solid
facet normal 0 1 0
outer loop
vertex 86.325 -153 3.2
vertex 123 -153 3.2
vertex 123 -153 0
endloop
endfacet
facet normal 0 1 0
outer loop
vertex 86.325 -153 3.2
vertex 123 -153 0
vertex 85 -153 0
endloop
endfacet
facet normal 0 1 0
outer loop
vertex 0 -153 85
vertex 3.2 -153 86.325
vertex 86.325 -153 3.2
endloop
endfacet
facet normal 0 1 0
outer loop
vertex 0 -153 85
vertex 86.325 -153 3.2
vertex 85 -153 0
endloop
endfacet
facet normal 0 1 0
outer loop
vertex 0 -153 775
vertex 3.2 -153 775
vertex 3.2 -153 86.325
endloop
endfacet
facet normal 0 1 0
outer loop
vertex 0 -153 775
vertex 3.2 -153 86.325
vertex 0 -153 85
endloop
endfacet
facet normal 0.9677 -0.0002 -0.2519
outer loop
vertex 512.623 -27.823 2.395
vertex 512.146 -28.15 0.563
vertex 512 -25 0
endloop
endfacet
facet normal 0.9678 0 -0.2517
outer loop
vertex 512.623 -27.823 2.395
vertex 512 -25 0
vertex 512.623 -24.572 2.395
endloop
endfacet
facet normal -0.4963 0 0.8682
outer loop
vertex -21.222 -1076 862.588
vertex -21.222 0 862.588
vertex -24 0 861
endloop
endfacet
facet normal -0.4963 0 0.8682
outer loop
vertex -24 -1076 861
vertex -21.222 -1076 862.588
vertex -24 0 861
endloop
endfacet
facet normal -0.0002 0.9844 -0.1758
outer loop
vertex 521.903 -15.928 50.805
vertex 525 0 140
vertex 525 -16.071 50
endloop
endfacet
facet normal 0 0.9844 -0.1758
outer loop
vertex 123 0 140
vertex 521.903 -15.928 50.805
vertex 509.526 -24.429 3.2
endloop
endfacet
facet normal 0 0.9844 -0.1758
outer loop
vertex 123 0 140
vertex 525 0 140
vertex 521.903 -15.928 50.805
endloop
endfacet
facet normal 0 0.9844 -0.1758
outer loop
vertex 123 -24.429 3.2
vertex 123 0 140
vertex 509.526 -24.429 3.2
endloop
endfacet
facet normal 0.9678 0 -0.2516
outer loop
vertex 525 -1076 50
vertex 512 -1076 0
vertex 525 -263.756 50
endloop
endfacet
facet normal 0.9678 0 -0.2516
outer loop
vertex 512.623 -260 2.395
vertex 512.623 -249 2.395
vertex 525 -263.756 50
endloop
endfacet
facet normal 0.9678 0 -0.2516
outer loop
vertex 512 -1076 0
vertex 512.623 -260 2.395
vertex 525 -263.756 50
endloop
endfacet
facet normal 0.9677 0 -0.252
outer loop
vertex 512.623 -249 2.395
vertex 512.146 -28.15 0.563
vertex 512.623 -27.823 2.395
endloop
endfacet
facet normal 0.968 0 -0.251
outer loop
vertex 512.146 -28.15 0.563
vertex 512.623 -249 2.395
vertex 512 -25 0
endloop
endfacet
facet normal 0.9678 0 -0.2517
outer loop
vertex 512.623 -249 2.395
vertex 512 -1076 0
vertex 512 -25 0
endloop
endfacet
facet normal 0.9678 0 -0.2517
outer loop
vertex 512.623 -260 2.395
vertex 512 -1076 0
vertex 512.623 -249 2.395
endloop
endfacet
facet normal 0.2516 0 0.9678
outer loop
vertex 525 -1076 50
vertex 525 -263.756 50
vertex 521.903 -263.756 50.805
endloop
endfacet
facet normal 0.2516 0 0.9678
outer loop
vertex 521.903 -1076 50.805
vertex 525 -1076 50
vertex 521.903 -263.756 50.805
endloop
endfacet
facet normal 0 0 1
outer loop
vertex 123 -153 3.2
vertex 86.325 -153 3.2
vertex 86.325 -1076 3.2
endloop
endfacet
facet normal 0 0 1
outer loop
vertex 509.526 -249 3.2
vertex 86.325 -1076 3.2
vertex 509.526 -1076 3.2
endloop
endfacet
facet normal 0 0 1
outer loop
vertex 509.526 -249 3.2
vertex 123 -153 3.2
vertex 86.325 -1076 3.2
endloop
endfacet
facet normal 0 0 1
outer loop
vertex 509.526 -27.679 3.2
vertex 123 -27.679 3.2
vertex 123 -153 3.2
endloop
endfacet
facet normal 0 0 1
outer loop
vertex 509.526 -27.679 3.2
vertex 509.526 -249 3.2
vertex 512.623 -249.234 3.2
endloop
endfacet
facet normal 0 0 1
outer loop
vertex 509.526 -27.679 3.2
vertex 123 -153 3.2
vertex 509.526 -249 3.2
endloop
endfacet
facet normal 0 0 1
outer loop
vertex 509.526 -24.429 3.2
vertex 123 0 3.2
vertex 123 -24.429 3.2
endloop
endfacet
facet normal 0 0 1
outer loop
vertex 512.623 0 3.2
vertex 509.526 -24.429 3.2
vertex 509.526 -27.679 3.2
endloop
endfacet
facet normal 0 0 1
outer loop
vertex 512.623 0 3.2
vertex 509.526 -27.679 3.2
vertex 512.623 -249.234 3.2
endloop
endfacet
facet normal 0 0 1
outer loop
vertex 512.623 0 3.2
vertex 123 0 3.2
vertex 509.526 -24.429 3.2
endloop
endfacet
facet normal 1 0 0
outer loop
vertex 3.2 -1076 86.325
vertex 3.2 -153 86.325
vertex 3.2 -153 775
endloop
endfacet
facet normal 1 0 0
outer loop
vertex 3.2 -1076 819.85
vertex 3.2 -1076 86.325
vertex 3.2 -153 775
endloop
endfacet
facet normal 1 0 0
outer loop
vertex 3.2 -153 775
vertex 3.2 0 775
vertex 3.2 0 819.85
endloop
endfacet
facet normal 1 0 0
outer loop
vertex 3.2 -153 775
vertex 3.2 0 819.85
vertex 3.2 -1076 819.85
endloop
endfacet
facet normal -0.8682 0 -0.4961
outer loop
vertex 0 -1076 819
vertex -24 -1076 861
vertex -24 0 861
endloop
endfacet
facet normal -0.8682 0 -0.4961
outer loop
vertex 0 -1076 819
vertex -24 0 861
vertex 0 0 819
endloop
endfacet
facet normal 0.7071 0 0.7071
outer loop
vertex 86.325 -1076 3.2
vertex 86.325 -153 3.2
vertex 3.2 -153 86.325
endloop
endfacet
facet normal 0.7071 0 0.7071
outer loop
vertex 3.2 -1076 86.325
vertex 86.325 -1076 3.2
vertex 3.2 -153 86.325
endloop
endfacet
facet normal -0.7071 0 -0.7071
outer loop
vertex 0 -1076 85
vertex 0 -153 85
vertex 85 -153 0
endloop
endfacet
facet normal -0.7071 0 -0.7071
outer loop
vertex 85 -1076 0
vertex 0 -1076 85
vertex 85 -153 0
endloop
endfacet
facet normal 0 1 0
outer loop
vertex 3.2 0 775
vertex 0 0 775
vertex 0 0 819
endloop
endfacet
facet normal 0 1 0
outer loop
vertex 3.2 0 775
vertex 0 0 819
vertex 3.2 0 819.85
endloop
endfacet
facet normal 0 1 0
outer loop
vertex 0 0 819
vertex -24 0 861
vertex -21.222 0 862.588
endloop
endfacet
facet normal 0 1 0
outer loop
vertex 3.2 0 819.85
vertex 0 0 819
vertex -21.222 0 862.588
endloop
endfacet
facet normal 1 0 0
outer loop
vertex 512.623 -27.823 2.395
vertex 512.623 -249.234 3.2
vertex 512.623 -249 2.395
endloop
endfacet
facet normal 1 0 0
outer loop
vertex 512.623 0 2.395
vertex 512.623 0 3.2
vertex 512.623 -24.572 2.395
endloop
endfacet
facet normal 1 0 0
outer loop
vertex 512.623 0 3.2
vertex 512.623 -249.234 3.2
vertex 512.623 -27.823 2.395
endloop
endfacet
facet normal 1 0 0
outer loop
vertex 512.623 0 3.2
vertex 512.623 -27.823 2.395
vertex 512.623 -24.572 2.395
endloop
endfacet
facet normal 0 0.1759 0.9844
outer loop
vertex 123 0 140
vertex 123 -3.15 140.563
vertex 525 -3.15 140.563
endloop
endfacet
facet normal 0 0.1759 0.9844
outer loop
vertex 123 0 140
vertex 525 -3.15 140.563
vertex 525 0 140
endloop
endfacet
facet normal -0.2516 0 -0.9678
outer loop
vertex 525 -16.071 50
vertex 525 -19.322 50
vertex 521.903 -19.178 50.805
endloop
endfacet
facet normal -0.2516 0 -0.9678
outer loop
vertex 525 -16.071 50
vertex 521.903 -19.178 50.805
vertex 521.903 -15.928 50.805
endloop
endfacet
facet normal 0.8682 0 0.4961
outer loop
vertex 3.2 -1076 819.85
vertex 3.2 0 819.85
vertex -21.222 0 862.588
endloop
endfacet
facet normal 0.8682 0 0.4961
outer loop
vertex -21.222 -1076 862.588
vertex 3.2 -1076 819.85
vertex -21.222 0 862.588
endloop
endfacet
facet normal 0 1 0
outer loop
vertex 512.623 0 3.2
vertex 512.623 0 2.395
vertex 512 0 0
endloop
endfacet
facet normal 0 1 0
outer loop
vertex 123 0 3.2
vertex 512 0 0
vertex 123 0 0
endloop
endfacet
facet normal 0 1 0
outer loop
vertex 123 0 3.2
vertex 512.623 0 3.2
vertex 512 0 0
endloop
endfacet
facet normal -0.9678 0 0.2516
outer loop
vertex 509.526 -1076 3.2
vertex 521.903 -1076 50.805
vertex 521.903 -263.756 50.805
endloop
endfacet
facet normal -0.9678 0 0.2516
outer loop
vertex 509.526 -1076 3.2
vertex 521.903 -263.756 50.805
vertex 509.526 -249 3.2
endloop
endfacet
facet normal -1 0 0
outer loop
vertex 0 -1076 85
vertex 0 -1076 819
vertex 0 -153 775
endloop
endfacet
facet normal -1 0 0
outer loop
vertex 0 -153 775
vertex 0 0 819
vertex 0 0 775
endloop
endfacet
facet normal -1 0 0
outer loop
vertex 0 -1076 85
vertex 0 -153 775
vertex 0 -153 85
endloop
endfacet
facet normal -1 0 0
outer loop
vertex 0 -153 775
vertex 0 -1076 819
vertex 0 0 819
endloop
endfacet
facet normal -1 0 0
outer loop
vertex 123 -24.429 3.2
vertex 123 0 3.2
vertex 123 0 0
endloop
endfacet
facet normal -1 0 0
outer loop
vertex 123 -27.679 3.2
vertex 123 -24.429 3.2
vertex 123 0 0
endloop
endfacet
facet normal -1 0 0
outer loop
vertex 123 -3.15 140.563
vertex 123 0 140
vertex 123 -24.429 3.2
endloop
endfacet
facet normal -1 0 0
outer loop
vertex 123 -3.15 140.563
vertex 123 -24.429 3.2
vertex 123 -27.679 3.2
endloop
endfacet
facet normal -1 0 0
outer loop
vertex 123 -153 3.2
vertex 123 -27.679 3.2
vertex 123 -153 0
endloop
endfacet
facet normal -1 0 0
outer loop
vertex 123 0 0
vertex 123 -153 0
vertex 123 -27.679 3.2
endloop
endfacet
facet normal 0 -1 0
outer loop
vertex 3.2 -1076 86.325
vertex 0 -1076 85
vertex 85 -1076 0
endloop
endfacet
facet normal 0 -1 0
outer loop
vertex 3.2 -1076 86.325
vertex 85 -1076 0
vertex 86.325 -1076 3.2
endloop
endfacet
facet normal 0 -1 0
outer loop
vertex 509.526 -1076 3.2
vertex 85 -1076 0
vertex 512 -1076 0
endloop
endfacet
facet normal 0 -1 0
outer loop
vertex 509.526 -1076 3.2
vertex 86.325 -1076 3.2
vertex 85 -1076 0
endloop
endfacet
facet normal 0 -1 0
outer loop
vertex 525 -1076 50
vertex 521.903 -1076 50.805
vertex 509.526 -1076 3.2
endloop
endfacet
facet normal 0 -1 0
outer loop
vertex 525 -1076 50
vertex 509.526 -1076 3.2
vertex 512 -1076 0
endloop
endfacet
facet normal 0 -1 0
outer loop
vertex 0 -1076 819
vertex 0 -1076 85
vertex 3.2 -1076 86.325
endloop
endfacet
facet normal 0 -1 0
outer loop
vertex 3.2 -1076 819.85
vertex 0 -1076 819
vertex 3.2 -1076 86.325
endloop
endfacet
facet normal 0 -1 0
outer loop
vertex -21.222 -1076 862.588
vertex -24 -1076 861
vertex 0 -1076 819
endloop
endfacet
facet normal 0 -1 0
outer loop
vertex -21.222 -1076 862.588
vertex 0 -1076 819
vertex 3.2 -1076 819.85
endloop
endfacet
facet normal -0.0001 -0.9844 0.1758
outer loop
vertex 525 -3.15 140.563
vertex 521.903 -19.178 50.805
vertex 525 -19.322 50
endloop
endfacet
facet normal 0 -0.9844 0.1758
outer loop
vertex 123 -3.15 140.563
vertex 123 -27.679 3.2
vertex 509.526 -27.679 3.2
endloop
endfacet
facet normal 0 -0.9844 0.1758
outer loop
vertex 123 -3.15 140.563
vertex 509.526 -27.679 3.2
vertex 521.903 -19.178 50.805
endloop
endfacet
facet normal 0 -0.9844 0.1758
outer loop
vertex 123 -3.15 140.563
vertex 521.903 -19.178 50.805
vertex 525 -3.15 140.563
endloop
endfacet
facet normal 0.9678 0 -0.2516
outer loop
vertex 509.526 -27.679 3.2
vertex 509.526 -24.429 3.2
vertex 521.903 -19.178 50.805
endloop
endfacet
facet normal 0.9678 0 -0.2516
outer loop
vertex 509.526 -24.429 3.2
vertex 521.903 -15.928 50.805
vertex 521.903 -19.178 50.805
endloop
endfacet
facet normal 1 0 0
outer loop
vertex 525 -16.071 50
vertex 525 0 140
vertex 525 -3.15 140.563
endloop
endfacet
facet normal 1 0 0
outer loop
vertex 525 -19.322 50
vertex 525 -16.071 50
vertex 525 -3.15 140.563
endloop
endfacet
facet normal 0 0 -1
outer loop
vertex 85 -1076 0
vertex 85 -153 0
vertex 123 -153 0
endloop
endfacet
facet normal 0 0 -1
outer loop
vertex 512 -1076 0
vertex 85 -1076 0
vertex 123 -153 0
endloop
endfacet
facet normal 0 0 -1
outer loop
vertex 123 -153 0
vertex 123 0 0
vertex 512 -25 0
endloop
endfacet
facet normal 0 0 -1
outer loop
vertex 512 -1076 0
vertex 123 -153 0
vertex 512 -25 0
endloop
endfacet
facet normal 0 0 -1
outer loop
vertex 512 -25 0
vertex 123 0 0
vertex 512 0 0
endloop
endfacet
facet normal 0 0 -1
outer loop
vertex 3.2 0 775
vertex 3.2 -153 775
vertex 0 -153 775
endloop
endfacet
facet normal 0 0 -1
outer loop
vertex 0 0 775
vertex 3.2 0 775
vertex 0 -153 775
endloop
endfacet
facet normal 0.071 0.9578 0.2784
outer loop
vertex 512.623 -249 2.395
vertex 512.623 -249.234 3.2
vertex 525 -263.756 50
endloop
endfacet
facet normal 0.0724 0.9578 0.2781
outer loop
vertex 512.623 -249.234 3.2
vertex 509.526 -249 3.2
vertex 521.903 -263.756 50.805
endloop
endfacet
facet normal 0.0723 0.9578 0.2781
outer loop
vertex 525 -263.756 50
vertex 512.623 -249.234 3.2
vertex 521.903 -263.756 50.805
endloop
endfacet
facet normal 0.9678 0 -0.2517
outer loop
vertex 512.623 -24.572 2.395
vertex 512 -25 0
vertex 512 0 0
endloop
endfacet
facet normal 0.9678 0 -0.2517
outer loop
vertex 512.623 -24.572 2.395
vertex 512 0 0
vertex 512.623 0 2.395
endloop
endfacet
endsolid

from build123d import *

# Parameters (mm, degrees)
F1_DEPTH  = 1076
F2_W      = 123
F2_H      = 775
F3_DEPTH  = 153
F5_DEPTH  = 402
F7_DEPTH  = 25
F9_DEPTH  = 50
F11_DEPTH = 260


with BuildPart() as f1:
    # F0 (on Front) → F1 (new body)
    with BuildSketch(Plane.XZ):
        Polygon((0, 819), (0, 85), (85, 0), (512, 0), (525, 50), (521.9029679783, 50.8052283256), (509.5256086136, 3.2), (86.3254833996, 3.2), (3.2, 86.3254833996), (3.2, 819.8498061986), (-21.2216219452, 862.5876446027), (-24, 861), align=None)
    extrude(amount=F1_DEPTH)

    # F2 (on face) → F3 (cut)
    with BuildSketch(Plane(origin=(0, 0, 0), x_dir=(-1, 0, 0), z_dir=(0, 1, 0))):
        with Locations((-61.5, 387.5)):
            Rectangle(F2_W, F2_H)
    extrude(amount=-F3_DEPTH, mode=Mode.SUBTRACT)

    # F4 (on face) → F5 (join)
    with BuildSketch(Plane(origin=(123, 0, 0), x_dir=(0, -1, 0), z_dir=(-1, 0, 0))):
        Polygon((0, 140), (25, 0), (28.1501682416, 0.5625300431), (3.1501682416, 140.5625300431), align=None)
    extrude(amount=-F5_DEPTH)

    # F6 (on face) → F7 (cut)
    with BuildSketch(Plane(origin=(476.483335157, 0, -123.8856671408), x_dir=(0, -1, 0), z_dir=(-0.9678225068, 0, 0.2516338518))):
        Polygon((15.927637799, 180.498897516), (24.4285714286, 131.31092349), (27.6760096229, 131.31092349), (19.1750759933, 180.498897516), align=None)
        Polygon((19.1750759933, 180.498897516), (27.6760096229, 131.31092349), (249, 131.31092349), (263.7563922078, 180.498897516), align=None)
        Polygon((0, 180.498897516), (0, 131.31092349), (24.4285714286, 131.31092349), (15.927637799, 180.498897516), align=None)
    extrude(amount=-F7_DEPTH, mode=Mode.SUBTRACT)

    # F8 (on face) → F9 (cut)
    with BuildSketch(Plane(origin=(0, 0, 0), x_dir=(-1, 0, 0), z_dir=(0, 1, 0))):
        Polygon((-525.584936142, 0), (-512, 0), (-513.4268980016, 5.488069237), align=None)
    extrude(amount=-F9_DEPTH, mode=Mode.SUBTRACT)

    # F10 (on face) → F11 (join)
    with BuildSketch(Plane(origin=(0, 0, 0), x_dir=(-1, 0, 0), z_dir=(0, 1, 0))):
        Polygon((-512.6226406353, 2.3947716744), (-509.5256086136, 3.2), (-512.6226406353, 3.2), align=None)
    extrude(amount=-F11_DEPTH)


solid = f1.part
